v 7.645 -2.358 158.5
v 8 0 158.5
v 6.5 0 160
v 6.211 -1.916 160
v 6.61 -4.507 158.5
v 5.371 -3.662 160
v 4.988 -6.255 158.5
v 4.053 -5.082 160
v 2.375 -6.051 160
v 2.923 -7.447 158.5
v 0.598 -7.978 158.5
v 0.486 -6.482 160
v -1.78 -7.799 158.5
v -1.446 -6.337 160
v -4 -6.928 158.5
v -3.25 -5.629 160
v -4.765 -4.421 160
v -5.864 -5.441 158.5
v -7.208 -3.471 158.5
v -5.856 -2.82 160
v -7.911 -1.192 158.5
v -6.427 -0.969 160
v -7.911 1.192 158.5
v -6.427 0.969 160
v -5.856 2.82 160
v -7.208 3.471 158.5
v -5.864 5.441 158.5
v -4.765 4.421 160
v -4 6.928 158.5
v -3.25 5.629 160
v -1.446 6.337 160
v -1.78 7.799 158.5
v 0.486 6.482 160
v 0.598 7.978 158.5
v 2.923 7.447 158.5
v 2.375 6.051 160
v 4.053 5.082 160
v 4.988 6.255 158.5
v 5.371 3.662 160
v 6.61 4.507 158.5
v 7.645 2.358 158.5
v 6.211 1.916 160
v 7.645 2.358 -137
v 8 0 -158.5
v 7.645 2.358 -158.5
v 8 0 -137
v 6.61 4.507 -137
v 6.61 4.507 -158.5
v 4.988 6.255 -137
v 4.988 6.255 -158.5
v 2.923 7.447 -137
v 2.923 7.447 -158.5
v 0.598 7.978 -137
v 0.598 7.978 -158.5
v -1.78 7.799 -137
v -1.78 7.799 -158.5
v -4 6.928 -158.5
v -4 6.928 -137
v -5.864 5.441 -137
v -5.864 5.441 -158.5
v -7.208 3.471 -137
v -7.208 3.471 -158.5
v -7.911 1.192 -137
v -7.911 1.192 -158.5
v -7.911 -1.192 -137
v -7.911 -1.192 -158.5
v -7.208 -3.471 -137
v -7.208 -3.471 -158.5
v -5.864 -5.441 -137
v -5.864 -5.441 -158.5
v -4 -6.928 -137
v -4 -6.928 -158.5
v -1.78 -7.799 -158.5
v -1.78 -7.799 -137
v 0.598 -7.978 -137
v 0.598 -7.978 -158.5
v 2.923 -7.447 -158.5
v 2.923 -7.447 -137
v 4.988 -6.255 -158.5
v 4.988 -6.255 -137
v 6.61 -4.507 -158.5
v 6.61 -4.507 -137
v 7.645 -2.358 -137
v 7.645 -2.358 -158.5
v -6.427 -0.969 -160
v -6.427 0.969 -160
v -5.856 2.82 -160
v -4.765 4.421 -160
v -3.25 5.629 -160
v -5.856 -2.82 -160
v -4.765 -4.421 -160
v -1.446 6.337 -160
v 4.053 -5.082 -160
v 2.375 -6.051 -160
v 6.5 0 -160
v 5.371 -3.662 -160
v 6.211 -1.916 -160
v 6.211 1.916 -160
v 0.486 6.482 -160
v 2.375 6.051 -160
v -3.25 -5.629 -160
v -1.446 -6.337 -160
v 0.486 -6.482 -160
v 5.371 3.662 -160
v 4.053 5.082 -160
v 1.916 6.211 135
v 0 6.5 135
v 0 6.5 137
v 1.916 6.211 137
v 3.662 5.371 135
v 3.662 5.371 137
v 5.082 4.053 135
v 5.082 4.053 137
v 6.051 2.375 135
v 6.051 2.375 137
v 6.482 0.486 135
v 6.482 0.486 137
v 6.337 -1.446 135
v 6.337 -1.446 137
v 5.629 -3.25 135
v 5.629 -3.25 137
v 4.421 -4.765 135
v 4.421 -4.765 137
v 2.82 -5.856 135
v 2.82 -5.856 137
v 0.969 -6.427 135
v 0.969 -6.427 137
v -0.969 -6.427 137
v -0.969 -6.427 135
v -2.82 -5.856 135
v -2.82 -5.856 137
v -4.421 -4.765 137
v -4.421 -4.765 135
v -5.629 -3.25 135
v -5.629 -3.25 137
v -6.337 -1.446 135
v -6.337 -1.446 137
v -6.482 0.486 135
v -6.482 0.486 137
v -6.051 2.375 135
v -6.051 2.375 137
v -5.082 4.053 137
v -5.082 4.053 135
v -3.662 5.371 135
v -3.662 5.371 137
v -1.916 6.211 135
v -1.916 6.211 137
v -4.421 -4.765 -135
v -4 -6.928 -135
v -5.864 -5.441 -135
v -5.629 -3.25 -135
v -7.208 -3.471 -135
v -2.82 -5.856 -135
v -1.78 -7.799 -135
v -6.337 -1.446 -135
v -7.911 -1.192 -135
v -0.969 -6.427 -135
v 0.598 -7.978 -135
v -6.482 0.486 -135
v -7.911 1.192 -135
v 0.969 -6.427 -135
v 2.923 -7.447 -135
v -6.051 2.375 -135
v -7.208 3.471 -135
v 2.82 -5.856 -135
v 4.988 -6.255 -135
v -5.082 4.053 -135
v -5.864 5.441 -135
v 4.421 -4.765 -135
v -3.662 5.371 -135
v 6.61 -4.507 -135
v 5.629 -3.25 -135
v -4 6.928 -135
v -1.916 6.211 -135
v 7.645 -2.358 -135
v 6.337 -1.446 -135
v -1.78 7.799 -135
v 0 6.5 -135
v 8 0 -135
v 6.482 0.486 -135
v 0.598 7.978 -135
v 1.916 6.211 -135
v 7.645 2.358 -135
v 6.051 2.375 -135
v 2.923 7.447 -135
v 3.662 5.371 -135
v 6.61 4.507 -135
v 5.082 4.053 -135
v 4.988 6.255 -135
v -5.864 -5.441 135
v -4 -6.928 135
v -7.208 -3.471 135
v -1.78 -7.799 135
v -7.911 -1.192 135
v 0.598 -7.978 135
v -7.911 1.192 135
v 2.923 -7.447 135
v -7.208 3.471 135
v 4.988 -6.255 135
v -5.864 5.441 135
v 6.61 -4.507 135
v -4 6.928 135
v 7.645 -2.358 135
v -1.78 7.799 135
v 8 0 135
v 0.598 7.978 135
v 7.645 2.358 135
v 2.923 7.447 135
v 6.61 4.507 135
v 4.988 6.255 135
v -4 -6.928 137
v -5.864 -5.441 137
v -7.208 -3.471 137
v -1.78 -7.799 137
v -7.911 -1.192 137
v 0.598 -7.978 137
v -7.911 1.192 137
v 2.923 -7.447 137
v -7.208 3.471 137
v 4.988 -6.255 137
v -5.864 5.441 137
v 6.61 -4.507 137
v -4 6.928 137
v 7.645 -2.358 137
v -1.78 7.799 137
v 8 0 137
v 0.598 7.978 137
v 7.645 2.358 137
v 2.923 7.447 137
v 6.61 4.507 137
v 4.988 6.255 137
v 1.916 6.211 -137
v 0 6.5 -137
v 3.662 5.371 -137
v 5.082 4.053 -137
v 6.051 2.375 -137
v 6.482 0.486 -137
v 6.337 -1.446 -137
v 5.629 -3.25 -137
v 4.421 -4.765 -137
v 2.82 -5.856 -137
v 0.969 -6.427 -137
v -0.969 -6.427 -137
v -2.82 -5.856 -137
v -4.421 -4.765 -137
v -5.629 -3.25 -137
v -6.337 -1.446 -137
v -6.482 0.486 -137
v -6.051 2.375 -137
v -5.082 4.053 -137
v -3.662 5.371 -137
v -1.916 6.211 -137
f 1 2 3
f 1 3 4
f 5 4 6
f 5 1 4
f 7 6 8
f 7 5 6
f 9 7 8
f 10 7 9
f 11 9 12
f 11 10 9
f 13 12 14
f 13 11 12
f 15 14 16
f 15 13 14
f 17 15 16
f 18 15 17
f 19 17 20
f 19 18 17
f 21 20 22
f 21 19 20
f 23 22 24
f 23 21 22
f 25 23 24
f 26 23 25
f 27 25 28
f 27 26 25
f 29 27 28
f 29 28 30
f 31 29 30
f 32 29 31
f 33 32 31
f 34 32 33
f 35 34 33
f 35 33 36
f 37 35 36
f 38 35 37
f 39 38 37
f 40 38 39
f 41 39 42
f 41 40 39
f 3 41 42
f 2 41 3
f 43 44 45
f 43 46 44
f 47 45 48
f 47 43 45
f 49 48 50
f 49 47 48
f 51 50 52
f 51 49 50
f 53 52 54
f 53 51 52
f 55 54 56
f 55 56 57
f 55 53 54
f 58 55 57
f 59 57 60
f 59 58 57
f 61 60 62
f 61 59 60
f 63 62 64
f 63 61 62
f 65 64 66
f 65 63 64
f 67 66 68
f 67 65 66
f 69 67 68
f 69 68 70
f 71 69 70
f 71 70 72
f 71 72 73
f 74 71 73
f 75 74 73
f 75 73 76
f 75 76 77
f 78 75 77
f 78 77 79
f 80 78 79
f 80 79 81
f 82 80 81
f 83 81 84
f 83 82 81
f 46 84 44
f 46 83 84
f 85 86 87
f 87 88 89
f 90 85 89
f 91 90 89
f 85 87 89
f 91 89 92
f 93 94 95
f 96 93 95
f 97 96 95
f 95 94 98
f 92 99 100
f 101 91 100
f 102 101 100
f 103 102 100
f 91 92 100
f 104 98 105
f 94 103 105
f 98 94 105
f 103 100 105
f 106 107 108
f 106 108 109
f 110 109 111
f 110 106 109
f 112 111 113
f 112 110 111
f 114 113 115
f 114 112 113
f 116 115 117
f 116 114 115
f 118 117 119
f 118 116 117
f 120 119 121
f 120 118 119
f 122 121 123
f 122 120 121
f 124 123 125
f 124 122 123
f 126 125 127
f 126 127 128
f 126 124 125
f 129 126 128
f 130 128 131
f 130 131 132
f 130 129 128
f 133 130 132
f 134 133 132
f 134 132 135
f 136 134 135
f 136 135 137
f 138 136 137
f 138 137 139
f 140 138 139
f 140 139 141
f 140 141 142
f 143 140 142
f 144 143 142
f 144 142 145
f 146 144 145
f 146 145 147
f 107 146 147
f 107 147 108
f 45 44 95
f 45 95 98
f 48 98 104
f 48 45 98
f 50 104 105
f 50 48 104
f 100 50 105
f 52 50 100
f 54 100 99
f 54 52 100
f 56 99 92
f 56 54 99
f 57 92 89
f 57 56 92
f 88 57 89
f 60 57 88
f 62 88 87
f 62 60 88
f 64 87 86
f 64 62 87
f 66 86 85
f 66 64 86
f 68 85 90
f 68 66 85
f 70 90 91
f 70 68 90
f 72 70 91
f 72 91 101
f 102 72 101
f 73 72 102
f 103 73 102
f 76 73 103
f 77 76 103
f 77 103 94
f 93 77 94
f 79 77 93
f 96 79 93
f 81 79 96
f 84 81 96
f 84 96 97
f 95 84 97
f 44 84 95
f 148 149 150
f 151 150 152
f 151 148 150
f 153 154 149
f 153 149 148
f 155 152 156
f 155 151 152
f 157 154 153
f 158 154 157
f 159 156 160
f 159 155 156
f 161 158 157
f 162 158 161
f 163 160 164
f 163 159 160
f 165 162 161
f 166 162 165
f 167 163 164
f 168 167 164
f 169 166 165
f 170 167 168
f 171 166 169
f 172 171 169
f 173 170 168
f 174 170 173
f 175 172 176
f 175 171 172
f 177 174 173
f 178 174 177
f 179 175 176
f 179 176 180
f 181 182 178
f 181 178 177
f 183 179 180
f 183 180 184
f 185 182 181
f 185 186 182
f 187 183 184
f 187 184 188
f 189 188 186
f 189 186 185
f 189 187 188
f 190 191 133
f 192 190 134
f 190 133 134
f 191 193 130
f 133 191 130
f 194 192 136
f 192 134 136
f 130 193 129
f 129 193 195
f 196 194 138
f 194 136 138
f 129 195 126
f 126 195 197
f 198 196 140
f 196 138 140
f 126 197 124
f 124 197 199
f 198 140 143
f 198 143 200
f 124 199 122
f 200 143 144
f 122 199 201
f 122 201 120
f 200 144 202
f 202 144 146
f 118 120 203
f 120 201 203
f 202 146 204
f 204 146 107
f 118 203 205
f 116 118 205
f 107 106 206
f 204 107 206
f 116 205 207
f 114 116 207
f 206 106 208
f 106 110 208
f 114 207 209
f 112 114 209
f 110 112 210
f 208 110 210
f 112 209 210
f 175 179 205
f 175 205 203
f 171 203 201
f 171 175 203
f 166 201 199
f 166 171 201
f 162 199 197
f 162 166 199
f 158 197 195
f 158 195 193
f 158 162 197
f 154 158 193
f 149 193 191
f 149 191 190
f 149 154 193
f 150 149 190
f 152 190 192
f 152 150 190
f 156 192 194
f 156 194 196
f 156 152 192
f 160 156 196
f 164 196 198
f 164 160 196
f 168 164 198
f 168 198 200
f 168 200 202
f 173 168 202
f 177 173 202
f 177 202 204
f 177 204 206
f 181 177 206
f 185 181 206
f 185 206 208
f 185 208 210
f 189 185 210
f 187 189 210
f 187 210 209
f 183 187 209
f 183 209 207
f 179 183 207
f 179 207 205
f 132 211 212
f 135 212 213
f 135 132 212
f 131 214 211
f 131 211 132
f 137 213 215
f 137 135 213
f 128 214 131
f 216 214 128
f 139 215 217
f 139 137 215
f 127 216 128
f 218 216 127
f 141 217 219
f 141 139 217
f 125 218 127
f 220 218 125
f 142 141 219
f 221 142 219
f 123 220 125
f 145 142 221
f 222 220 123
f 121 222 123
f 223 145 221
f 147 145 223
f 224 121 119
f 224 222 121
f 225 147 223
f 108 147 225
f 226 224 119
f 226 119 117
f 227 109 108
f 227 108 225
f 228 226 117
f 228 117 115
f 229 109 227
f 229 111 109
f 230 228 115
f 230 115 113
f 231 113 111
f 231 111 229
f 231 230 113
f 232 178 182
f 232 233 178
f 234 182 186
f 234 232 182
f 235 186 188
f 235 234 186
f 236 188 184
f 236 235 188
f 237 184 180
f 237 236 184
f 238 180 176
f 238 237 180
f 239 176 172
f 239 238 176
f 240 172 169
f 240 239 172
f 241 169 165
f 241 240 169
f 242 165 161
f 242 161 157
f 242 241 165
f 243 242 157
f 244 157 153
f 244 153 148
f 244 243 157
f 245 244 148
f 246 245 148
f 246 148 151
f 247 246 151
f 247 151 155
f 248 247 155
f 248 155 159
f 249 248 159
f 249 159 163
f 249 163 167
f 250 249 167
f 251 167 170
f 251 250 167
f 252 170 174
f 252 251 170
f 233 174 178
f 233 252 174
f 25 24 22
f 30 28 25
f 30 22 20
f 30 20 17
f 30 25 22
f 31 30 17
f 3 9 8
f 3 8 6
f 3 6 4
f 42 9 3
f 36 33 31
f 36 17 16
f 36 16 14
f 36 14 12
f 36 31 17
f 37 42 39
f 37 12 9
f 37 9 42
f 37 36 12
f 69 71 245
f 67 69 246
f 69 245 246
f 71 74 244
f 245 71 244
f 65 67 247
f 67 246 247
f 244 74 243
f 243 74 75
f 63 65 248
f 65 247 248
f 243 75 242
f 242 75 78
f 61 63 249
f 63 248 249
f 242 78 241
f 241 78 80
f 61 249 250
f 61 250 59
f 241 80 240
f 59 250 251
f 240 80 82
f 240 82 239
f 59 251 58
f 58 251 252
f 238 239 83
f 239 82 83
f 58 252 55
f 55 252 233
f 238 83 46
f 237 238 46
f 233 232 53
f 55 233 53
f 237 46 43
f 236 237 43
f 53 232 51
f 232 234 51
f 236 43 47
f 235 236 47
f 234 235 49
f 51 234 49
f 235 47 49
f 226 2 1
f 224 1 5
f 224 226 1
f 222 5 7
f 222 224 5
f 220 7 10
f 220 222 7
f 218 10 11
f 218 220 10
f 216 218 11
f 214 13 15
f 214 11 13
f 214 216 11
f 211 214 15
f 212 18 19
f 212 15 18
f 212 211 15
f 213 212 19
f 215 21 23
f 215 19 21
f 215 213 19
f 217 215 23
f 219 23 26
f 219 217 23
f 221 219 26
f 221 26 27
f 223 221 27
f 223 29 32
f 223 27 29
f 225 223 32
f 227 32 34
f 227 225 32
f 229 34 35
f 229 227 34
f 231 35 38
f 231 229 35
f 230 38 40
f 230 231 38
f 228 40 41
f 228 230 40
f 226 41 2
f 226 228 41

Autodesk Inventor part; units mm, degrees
ref_plane "YZ Plane" through (0, 0, 0) normal (1, 0, 0) x (0, 1, 0)
ref_plane "XZ Plane" through (0, 0, 0) normal (0, 1, 0) x (-1, 0, 0)
ref_plane "XY Plane" through (0, 0, 0) normal (0, 0, 1) x (1, 0, 0)
sketch "Esboço1" plane through (0, 0, 0) normal (0, 0, 1) x (1, 0, 0)
  circle A0 centre (0, 0) radius 8
  dimension "d0" = 16
extrude "Extrusão1" add sketch "Esboço1" along normal mid plane 320
sketch "Esboço2" plane through (0, 0, 0) normal (1, 0, 0) x (0, 1, 0)
  line L0 (8, -160) -> (8, 160) projected
  line L1 (8, -135) -> (6.5, -135)
  line L2 (6.5, -135) -> (6.5, -137)
  line L3 (6.5, -137) -> (8, -137)
  line L4 (8, -137) -> (8, -135)
  line L5 (8, 137) -> (6.5, 137)
  line L6 (6.5, 137) -> (6.5, 135)
  line L7 (6.5, 135) -> (8, 135)
  line L8 (8, 135) -> (8, 137)
  line L9 (8, 160) -> (-8, 160) projected
  line L10 (-8, -160) -> (8, -160) projected
  line L11 (0, 0) -> (0, -160)
  dimension "d3" = 2
  dimension "d4" = 25
  dimension "d5" = 2
  dimension "d6" = 25
  dimension "d7" = 13
revolve "Revolução1" cut sketch "Esboço2" angle 360 about axis through (0, 0, 0) along (0, 0, -1)
thread "Rosca1" size "M16x2" class "6g" standard "ANSI Metric M Profile" full length
chamfer "Chanfro1" distance 1.5 angle 45 2 edges at (-8, 0, 160) (-8, 0, -160)
